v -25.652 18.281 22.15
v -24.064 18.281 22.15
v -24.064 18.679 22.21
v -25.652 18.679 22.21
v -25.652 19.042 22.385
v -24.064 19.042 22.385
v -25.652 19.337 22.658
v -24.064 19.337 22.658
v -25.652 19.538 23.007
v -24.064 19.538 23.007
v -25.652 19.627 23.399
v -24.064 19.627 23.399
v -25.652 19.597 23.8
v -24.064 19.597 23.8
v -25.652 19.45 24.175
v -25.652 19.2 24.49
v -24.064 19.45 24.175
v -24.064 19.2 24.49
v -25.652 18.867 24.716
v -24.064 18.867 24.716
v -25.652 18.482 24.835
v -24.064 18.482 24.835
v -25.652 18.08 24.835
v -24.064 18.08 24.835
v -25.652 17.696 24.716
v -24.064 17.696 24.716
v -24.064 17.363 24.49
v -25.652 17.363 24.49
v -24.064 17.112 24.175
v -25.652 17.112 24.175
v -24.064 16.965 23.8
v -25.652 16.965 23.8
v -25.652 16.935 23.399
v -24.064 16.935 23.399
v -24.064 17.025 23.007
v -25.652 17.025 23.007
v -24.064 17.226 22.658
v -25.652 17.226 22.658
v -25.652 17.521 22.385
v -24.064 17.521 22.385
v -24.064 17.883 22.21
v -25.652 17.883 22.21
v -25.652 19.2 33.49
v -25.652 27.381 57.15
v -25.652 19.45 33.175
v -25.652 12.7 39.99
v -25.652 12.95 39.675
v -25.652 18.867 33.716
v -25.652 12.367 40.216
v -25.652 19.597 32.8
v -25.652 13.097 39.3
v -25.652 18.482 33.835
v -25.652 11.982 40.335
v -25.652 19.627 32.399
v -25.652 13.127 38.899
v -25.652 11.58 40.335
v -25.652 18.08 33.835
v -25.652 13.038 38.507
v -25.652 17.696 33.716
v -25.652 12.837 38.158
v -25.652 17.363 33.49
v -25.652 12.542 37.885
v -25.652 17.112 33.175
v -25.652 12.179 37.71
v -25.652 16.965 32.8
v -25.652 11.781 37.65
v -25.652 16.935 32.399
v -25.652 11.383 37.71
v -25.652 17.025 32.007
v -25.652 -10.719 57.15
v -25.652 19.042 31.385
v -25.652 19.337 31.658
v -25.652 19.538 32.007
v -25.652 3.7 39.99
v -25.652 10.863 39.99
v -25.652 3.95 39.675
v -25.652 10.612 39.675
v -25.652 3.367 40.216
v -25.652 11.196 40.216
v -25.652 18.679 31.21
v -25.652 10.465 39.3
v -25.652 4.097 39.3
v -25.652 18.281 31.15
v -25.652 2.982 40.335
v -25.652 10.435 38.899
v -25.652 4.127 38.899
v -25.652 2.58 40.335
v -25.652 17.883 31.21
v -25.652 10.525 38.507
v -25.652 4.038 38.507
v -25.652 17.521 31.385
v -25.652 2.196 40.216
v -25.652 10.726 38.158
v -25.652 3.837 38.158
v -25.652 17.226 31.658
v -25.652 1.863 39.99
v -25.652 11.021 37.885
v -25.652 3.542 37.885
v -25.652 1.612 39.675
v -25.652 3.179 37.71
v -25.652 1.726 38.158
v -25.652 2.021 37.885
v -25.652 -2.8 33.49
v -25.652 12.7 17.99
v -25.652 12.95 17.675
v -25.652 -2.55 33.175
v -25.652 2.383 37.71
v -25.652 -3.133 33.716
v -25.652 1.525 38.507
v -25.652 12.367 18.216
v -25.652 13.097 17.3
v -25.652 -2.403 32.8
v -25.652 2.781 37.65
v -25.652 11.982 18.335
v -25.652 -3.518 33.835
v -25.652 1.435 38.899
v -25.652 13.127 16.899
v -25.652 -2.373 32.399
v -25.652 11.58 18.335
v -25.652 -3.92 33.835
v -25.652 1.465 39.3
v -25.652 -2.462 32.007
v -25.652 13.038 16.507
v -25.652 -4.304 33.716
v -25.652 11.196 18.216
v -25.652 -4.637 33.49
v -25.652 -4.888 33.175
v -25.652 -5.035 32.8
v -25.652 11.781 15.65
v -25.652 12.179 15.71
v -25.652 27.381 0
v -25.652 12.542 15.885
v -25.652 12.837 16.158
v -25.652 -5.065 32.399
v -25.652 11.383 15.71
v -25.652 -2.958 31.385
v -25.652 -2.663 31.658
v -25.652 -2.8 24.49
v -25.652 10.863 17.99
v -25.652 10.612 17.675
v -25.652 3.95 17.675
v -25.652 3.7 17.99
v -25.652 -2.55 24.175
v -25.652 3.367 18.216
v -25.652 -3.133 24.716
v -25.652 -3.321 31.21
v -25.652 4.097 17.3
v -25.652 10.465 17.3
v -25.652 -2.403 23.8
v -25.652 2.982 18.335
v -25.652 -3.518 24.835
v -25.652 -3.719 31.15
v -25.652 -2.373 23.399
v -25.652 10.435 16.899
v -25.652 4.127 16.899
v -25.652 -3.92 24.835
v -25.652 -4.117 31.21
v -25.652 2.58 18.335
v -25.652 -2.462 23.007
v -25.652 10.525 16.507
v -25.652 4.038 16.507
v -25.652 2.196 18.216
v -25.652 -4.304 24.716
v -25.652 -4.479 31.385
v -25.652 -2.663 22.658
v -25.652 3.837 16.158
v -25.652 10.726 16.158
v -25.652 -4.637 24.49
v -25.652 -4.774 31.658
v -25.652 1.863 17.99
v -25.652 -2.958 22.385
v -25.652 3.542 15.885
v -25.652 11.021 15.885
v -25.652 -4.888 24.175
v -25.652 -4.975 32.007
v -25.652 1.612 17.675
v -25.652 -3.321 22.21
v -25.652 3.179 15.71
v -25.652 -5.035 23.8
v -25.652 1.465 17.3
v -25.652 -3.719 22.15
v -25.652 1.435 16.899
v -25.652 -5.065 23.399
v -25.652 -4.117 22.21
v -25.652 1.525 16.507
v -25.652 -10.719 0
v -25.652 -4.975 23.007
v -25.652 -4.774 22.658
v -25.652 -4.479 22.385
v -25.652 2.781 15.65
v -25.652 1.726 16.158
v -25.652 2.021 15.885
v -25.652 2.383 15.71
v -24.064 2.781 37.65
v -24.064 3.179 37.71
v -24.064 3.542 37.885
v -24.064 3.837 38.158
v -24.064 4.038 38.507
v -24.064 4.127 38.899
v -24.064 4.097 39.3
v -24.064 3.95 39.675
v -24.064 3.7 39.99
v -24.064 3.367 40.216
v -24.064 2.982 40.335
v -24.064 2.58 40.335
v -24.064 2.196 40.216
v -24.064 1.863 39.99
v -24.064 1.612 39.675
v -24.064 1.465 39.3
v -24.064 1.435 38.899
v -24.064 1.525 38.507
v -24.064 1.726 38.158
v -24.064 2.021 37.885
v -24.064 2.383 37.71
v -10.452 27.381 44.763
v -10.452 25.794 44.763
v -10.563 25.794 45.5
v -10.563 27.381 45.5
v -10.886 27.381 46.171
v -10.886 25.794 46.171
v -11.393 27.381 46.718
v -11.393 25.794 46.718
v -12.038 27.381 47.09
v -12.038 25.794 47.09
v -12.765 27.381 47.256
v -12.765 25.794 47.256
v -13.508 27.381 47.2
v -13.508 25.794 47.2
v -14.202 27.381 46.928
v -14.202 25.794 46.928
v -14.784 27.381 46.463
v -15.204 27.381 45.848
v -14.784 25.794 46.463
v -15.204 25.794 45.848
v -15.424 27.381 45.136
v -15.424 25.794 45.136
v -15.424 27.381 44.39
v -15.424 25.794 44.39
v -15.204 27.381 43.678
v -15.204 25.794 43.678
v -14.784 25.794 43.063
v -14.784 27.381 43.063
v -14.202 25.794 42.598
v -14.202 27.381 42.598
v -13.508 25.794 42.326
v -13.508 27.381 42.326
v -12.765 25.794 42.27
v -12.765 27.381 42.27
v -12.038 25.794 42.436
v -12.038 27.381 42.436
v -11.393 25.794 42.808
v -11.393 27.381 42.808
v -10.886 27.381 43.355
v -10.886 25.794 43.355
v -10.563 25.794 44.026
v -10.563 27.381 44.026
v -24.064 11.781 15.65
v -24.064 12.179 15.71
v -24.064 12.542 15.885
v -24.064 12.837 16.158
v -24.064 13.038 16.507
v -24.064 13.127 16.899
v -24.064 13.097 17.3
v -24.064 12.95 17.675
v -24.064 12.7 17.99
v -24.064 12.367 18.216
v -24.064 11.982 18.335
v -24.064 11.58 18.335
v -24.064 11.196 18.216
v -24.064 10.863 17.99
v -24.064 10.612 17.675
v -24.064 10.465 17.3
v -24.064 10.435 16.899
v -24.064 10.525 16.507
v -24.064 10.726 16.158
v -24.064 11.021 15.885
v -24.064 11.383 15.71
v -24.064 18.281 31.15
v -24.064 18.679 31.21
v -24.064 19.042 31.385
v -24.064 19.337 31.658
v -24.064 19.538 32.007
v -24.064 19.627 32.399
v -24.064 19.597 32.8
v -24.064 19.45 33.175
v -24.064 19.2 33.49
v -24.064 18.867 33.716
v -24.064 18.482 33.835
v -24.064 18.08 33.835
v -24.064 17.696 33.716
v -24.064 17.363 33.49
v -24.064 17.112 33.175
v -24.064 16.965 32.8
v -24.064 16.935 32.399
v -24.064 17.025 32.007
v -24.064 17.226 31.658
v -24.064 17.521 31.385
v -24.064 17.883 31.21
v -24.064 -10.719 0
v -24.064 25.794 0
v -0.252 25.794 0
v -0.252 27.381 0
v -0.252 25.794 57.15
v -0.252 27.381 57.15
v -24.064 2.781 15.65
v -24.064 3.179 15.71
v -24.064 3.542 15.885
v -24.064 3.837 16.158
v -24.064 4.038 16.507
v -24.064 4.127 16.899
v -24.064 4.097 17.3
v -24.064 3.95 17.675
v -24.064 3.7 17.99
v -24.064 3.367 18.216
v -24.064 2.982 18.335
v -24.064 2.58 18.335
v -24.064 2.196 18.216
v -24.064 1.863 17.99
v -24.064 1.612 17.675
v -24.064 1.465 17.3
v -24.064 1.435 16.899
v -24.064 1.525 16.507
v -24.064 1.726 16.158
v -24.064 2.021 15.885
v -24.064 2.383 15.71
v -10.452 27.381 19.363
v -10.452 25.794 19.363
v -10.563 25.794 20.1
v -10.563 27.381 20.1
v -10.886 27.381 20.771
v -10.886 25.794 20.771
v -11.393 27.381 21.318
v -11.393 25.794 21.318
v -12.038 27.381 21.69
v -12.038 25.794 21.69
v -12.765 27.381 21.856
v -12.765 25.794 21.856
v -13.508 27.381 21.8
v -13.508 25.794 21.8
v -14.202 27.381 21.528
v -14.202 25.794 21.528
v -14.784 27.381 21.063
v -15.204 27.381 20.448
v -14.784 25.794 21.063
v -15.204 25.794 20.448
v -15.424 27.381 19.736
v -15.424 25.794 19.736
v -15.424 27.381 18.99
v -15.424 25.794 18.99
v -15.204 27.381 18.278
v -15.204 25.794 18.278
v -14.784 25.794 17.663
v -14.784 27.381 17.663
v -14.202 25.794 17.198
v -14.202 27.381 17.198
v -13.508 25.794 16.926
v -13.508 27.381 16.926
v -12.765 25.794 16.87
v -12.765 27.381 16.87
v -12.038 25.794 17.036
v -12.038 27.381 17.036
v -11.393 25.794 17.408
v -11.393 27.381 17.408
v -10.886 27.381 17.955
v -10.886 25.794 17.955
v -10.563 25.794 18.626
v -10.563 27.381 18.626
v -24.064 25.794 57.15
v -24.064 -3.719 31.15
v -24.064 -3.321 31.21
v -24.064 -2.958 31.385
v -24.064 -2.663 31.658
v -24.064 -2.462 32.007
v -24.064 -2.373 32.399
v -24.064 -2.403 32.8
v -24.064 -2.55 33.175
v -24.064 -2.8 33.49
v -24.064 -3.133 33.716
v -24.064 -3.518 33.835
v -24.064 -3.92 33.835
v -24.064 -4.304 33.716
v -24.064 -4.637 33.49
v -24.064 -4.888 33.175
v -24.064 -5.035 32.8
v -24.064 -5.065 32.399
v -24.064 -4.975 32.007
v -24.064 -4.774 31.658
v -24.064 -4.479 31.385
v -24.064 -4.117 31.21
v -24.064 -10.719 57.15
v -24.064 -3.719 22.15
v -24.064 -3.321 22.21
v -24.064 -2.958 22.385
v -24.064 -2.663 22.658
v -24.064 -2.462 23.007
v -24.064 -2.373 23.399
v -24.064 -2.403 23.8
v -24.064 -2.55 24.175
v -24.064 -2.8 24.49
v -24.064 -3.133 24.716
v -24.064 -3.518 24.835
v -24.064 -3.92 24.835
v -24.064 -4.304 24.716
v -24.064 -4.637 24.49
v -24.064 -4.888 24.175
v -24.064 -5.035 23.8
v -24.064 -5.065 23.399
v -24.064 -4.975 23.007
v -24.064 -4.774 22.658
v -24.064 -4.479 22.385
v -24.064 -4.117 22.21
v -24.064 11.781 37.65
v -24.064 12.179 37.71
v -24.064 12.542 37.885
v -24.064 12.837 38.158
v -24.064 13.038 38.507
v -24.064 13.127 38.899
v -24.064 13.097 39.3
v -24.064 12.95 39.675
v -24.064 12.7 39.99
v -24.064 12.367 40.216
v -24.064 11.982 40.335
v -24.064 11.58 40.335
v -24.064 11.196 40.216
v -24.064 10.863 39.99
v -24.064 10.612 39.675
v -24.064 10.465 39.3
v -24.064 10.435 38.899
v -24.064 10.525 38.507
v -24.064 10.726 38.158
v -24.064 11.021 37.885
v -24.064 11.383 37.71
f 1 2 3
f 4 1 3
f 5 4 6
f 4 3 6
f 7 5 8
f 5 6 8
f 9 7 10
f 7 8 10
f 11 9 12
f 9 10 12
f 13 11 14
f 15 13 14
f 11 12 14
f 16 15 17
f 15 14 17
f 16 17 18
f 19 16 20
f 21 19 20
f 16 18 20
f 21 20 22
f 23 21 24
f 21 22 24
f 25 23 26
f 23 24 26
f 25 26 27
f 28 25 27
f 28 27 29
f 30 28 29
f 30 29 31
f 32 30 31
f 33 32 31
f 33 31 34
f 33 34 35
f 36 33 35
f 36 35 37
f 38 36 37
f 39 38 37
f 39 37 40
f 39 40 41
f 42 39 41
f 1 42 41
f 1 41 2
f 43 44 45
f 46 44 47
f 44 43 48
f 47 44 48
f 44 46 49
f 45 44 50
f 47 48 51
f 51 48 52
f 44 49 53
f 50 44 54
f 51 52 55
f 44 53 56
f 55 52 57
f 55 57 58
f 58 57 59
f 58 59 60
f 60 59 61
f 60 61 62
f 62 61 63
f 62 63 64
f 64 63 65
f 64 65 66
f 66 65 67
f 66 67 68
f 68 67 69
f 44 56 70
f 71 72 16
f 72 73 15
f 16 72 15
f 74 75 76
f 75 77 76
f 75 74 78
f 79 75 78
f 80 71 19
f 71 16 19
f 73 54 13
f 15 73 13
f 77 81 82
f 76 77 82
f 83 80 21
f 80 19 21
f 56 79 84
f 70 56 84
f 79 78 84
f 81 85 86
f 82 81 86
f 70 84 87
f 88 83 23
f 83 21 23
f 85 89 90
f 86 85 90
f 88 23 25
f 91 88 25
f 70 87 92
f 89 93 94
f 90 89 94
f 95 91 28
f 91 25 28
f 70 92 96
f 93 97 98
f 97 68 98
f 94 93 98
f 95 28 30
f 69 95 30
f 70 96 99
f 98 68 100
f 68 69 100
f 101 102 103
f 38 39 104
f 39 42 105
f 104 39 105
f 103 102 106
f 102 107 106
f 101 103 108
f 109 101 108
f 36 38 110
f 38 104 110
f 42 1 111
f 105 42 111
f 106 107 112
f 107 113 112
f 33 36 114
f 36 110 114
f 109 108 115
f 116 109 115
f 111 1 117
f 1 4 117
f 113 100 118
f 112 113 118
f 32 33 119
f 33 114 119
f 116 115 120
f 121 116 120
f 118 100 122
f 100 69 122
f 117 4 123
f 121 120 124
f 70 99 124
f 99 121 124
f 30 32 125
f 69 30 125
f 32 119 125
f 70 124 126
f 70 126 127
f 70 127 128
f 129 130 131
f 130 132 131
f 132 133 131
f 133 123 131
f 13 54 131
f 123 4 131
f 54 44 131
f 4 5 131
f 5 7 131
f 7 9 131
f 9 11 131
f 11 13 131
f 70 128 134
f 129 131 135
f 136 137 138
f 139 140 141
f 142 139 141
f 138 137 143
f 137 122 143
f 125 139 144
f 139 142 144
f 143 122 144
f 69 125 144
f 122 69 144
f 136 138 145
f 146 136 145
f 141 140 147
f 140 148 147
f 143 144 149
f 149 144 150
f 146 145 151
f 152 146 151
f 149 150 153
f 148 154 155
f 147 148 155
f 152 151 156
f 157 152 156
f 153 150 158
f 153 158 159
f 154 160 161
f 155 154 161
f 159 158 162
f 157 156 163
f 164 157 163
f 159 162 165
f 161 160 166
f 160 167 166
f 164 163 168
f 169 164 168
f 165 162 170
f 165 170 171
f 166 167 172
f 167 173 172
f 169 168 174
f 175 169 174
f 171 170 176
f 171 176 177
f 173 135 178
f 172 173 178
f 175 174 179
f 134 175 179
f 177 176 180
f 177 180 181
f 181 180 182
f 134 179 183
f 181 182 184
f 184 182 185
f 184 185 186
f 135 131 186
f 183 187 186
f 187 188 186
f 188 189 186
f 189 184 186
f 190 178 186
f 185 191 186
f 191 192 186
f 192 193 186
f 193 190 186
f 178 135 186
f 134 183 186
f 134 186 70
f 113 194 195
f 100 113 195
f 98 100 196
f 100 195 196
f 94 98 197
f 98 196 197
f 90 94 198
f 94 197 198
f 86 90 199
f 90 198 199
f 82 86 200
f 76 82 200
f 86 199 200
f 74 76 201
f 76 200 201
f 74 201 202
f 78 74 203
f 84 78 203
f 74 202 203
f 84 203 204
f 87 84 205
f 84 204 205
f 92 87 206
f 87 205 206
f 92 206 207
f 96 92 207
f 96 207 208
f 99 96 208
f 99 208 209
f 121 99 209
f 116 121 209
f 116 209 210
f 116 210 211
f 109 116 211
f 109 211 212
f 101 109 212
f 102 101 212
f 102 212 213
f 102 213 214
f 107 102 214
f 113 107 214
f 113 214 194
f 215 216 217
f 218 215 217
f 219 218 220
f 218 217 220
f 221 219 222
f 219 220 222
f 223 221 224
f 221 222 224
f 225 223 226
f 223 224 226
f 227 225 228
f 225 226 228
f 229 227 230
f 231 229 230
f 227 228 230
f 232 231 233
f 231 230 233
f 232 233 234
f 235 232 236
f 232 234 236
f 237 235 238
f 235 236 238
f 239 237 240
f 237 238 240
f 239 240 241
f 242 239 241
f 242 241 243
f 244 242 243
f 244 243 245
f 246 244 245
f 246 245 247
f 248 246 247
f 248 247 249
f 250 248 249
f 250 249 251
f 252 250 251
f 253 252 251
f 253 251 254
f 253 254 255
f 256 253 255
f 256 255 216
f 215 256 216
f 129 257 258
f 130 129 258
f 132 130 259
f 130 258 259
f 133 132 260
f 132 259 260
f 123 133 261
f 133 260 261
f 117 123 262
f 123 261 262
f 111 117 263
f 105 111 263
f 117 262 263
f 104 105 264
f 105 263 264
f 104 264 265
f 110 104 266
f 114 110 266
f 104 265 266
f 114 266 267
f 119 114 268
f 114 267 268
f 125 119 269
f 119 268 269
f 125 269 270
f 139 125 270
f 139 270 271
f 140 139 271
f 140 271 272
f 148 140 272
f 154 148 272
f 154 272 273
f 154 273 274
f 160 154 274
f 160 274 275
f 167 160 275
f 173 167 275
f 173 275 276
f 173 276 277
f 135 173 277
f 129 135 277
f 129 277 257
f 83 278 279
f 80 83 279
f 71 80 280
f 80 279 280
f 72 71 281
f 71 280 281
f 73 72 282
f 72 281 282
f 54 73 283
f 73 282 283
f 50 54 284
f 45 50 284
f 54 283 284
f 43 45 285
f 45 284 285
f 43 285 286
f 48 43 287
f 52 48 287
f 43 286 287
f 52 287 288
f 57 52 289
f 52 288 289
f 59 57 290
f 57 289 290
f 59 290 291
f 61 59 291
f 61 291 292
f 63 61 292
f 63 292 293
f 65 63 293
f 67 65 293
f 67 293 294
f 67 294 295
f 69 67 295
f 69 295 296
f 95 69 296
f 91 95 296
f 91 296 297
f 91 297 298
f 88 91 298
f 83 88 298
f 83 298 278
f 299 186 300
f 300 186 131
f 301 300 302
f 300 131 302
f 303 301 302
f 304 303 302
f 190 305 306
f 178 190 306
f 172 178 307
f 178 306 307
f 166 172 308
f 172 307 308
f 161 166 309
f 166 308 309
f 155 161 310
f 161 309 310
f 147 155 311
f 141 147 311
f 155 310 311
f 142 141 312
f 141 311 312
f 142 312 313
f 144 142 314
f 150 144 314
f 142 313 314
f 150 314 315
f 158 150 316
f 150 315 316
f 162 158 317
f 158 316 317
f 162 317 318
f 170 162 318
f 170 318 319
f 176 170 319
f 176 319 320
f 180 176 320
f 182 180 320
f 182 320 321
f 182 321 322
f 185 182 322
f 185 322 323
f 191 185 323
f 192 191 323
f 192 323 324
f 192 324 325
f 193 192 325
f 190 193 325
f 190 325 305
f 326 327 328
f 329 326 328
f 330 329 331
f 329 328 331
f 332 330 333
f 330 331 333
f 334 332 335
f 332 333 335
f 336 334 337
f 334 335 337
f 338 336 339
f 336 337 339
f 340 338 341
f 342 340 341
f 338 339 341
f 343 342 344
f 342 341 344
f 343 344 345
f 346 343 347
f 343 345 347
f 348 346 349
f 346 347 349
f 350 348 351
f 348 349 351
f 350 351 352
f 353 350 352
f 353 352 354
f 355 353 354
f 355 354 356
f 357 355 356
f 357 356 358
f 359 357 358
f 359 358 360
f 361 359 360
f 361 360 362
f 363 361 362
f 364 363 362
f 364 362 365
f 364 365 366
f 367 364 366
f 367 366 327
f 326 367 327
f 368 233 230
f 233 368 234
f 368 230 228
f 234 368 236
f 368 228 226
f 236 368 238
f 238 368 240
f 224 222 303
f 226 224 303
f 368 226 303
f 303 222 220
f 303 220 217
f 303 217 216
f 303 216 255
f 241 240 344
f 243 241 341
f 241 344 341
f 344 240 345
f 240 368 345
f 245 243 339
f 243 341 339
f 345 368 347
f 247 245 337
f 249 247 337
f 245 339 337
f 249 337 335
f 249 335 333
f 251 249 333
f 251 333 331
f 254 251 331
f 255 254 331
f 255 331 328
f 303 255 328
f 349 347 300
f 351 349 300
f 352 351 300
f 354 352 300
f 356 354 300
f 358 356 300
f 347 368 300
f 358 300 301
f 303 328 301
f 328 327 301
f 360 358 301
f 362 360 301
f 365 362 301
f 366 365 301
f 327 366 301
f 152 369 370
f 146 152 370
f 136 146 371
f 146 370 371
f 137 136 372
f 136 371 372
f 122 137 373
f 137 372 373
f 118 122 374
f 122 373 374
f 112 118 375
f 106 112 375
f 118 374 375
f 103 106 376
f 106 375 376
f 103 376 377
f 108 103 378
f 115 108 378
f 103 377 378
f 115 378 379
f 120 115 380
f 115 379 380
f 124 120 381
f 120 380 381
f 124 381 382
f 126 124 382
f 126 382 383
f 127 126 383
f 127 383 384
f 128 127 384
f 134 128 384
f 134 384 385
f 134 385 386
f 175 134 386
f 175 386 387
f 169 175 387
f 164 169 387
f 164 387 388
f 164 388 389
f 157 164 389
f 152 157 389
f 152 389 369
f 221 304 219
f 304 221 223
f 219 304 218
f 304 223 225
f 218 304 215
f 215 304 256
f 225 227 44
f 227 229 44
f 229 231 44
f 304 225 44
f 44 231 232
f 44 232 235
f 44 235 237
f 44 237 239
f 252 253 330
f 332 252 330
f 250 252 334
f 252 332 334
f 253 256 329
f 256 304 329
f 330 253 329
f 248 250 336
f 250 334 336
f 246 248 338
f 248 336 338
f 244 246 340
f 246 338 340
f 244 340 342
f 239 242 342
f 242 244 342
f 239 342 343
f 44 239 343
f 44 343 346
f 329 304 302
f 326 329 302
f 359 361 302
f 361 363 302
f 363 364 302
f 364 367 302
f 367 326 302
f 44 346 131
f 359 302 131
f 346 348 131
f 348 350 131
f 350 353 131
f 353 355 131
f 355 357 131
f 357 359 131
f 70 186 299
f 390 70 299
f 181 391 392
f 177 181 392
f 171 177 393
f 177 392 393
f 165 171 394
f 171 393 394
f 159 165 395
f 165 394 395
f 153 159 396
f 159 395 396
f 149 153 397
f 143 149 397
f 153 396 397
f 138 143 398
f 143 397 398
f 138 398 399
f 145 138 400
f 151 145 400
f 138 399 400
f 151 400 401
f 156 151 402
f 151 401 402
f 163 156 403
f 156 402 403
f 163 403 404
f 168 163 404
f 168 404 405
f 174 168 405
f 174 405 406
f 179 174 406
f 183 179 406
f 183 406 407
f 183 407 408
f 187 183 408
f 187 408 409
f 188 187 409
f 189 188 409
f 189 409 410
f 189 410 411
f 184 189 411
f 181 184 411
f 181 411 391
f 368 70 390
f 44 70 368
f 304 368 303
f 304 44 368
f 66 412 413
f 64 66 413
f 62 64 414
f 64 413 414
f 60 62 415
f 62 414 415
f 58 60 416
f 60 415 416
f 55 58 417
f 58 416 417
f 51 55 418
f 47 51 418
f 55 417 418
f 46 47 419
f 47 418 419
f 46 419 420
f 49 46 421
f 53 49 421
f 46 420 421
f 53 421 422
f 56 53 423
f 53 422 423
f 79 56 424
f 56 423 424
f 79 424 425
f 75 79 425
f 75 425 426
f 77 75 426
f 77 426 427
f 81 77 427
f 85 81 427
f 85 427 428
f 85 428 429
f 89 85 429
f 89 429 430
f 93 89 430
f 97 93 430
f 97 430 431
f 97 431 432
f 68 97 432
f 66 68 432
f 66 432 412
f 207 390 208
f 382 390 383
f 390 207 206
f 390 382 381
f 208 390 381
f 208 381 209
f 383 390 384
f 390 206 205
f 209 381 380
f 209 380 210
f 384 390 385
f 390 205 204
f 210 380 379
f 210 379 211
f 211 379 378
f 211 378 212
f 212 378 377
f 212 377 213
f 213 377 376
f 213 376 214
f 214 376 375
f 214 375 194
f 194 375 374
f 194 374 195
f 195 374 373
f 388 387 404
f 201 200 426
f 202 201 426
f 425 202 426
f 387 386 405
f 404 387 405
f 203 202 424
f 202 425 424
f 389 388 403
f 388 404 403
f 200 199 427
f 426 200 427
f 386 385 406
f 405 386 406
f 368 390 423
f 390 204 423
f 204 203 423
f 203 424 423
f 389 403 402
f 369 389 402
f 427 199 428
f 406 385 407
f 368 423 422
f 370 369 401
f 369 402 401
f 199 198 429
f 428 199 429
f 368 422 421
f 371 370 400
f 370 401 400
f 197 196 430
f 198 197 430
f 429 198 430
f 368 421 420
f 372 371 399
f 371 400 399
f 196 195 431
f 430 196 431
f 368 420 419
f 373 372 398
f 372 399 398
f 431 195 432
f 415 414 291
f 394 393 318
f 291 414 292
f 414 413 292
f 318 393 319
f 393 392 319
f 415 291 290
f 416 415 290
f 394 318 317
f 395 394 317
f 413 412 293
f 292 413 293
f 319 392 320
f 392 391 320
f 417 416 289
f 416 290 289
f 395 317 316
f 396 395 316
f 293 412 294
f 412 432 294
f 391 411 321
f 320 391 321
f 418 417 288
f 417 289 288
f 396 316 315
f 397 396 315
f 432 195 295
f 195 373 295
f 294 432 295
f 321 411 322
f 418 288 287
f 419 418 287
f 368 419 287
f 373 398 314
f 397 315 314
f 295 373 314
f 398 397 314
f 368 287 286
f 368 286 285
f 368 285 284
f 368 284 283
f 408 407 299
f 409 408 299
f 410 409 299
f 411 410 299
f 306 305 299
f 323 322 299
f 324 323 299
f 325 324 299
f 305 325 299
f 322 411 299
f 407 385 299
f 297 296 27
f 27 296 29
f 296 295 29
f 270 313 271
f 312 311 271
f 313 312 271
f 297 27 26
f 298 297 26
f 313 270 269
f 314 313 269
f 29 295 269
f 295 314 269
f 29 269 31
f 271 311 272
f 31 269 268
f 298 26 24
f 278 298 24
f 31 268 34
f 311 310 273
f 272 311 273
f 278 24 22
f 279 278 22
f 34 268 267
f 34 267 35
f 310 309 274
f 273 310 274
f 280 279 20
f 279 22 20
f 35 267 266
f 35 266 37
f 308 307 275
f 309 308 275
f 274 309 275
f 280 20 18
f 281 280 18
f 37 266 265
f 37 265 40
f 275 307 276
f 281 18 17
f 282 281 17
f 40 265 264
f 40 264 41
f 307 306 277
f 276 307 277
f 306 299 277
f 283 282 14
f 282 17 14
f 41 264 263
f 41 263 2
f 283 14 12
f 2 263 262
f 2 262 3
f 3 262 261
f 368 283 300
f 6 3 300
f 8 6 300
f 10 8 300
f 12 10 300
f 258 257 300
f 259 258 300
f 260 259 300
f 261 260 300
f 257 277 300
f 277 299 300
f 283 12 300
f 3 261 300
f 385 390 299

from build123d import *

# Parameters (mm, degrees)
BOSS_EXTRUDE1_DEPTH = 57.15
SKETCH3_R           = 1.35
CUT_EXTRUDE1_DEPTH  = 2.5875
SKETCH2_R           = 2.5
CUT_EXTRUDE2_DEPTH  = 2.5875


with BuildPart() as part:
    # Sketch1 → Boss-Extrude1 (new body)
    with BuildSketch(Plane.XY):
        Polygon((-0.251653512, 27.381273354), (-25.651653512, 27.381273354), (-25.651653512, -10.718726646), (-24.064153512, -10.718726646), (-24.064153512, 25.793773354), (-0.251653512, 25.793773354), align=None)
    extrude(amount=BOSS_EXTRUDE1_DEPTH)

    # Sketch3 → Cut-Extrude1 (cut, through all)
    with BuildSketch(Plane(origin=(-24.064153512, 0, 0), x_dir=(0, 0, -1), z_dir=(1, 0, 0))):
        with Locations((-32.5, 18.281273354)):
            Circle(SKETCH3_R)
        with Locations((-23.5, 18.281273354)):
            Circle(SKETCH3_R)
        with Locations((-17, 11.781273354)):
            Circle(SKETCH3_R)
        with Locations((-17, 2.781273354)):
            Circle(SKETCH3_R)
        with Locations((-23.5, -3.718726646)):
            Circle(SKETCH3_R)
        with Locations((-32.5, -3.718726646)):
            Circle(SKETCH3_R)
        with Locations((-39, 2.781273354)):
            Circle(SKETCH3_R)
        with Locations((-39, 11.781273354)):
            Circle(SKETCH3_R)
    extrude(amount=-CUT_EXTRUDE1_DEPTH, mode=Mode.SUBTRACT)

    # Sketch2 → Cut-Extrude2 (cut, through all)
    with BuildSketch(Plane.XZ.offset(-25.793773354)):
        with Locations((-12.951653512, 44.762965599)):
            Circle(SKETCH2_R)
        with Locations((-12.951653512, 19.362965599)):
            Circle(SKETCH2_R)
    extrude(amount=-CUT_EXTRUDE2_DEPTH, mode=Mode.SUBTRACT)


solid = part.part
